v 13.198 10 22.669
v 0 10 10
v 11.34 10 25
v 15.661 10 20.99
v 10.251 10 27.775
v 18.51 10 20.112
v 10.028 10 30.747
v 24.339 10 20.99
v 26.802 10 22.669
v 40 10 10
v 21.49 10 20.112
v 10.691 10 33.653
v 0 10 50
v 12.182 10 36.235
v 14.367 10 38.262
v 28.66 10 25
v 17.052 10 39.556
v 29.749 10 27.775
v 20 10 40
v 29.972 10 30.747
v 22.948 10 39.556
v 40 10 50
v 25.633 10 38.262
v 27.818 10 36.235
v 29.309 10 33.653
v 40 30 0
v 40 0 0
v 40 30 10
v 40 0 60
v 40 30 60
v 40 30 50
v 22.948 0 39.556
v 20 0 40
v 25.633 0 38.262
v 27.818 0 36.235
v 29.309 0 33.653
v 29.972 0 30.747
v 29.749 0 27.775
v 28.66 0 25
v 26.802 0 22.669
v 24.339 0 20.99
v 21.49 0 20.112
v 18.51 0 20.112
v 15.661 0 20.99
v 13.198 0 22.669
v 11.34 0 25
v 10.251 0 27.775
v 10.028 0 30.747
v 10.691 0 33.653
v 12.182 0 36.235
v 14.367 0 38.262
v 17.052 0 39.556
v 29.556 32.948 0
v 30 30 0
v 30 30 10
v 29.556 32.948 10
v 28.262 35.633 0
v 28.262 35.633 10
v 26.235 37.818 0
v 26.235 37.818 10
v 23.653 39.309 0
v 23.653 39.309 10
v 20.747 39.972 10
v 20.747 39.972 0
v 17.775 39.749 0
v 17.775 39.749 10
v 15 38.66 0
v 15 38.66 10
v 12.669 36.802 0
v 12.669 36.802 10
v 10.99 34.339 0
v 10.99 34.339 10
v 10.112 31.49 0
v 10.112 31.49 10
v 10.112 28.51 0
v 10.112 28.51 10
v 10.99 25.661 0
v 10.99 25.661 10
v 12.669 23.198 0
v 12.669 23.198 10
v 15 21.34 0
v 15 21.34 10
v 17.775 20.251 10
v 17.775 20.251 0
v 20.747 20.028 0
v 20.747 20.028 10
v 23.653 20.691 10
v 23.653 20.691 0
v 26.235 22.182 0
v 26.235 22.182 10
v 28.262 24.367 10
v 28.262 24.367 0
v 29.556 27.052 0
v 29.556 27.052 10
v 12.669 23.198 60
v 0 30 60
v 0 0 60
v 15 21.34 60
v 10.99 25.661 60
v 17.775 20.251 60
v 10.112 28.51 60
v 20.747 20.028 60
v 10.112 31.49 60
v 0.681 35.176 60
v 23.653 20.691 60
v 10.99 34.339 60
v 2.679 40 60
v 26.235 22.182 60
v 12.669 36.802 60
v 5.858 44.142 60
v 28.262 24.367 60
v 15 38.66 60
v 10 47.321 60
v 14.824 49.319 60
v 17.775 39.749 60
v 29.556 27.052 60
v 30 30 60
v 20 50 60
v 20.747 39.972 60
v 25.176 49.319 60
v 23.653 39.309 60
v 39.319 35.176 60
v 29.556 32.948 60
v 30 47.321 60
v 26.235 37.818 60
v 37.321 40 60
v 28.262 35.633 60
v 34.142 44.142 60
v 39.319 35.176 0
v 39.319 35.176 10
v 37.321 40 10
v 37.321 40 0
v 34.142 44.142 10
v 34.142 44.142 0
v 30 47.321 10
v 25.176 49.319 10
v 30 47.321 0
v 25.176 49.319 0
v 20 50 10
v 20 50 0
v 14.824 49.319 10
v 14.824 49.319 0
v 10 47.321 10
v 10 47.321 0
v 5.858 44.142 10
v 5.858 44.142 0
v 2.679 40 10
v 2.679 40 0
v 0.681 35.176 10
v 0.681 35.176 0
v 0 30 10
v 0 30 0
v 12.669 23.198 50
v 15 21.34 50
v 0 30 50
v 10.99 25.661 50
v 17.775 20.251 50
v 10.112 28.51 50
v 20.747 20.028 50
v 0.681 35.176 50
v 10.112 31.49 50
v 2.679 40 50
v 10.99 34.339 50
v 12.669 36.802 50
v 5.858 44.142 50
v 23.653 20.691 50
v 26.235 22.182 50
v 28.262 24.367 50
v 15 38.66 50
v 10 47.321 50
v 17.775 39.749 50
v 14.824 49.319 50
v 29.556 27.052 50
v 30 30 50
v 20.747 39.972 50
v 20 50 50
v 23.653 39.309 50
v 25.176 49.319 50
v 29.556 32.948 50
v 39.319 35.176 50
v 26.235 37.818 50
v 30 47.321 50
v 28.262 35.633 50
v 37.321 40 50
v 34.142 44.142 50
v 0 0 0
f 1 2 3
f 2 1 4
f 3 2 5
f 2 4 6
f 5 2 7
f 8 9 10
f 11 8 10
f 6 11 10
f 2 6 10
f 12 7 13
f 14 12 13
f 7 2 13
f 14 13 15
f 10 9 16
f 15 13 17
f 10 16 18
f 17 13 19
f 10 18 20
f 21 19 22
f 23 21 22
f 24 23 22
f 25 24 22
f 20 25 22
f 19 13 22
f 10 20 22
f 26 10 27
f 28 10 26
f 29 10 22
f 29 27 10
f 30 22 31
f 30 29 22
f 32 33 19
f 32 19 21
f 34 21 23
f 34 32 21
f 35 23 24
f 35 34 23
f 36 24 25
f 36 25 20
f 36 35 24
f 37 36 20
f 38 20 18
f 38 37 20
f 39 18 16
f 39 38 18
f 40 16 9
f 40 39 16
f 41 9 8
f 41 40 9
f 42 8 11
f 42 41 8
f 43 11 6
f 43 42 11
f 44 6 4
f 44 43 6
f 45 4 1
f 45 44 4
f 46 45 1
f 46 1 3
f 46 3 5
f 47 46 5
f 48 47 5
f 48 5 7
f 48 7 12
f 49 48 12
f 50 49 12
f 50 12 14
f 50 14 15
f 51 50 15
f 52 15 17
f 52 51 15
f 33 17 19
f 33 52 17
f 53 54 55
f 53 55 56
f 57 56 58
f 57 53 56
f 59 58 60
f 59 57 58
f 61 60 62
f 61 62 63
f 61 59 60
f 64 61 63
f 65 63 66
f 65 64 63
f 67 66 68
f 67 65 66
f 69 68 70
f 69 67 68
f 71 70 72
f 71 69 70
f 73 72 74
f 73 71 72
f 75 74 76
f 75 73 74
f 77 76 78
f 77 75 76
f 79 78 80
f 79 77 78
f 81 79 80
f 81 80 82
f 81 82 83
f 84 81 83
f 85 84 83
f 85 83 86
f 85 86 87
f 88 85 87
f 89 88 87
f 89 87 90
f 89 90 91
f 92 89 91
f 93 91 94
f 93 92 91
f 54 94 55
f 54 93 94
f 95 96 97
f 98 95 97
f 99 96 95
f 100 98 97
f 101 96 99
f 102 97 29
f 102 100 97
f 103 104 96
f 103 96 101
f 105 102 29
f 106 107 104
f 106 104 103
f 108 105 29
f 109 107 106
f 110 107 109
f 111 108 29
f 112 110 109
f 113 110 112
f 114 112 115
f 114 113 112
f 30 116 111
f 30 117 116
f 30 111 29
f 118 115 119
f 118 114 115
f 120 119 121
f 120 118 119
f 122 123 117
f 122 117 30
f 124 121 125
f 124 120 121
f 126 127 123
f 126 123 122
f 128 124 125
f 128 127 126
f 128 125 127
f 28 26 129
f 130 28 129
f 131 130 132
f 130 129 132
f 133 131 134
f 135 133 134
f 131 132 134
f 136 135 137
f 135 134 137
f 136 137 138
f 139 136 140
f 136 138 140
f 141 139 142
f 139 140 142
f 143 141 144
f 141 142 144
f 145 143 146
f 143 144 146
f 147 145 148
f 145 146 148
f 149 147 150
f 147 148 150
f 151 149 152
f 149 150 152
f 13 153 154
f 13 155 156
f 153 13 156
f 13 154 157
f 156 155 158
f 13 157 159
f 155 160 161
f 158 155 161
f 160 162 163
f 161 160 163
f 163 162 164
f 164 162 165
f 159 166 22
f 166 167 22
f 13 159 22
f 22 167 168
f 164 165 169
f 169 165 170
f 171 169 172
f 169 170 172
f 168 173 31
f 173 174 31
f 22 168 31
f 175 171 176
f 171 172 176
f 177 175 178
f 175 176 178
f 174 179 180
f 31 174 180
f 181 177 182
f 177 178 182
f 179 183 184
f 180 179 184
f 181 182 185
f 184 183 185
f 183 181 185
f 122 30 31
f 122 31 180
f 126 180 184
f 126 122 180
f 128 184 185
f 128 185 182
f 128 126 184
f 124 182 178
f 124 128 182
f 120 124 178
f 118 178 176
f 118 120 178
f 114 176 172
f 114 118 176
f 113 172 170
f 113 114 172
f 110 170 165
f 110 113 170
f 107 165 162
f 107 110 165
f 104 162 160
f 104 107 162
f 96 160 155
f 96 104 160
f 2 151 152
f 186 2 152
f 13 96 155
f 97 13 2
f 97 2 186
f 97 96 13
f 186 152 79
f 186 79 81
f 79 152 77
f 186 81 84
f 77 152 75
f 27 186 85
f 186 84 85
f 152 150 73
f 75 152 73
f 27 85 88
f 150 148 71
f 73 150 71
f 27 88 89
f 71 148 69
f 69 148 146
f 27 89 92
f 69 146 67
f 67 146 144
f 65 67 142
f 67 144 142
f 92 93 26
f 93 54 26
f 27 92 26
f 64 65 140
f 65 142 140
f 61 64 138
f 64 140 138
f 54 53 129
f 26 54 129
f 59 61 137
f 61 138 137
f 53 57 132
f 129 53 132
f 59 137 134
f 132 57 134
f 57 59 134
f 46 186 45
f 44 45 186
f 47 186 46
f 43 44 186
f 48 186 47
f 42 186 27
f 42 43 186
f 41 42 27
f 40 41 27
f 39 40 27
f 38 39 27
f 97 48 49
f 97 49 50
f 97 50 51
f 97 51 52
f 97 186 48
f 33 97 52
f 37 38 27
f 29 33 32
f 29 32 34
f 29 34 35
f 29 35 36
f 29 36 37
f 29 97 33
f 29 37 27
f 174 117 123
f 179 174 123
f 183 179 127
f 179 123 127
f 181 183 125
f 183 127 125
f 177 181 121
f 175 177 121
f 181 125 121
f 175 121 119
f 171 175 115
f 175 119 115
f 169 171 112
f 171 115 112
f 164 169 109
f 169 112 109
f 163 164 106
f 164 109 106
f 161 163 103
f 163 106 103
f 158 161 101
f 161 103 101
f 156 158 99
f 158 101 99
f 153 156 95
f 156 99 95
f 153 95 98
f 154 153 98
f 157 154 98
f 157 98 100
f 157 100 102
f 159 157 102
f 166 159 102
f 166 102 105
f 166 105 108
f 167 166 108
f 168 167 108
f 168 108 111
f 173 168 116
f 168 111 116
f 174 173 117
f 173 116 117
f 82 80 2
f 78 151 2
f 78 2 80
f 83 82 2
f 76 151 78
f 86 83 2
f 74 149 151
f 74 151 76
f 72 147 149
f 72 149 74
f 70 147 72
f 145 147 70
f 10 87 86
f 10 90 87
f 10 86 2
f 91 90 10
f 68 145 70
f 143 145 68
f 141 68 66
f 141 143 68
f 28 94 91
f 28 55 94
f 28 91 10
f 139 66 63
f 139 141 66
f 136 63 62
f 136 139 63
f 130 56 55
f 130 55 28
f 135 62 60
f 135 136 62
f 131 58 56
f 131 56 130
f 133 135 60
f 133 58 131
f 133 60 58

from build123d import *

# Parameters (mm, degrees)
SKETCH1_W           = 40
SKETCH1_H           = 10
BOSS_EXTRUDE1_DEPTH = 30
SKETCH1_3_R         = 10
BOSS_EXTRUDE2_DEPTH = 10
SKETCH3_R           = 10
CUT_EXTRUDE1_DEPTH  = 10


with BuildPart() as part:
    # Sketch1 → Boss-Extrude1 (new body)
    with BuildSketch(Plane.XY):
        with Locations((20, 5)):
            Rectangle(SKETCH1_W, SKETCH1_H)
    boss_extrude1 = extrude(amount=BOSS_EXTRUDE1_DEPTH)

    # Sketch1<3> → Boss-Extrude2 (add)
    with BuildSketch(Plane.XY):
        with BuildLine():
            Line((0, 30), (0, 10))
            Line((0, 10), (40, 10))
            Line((40, 10), (40, 30))
            ThreePointArc((40, 30), (20, 50), (0, 30))
        make_face()
        with Locations((20, 30)):
            Circle(SKETCH1_3_R, mode=Mode.SUBTRACT)
    boss_extrude2 = extrude(amount=BOSS_EXTRUDE2_DEPTH)

    # Mirror2: Boss-Extrude1, Boss-Extrude2 across plane
    add(boss_extrude1.mirror(Plane.XY.offset(30)))
    add(boss_extrude2.mirror(Plane.XY.offset(30)))

    # Sketch3 → Cut-Extrude1 (cut)
    with BuildSketch(Plane(origin=(0, 0, 0), x_dir=(1, 0, 0), z_dir=(0, 1, 0))):
        with Locations((20, -30)):
            Circle(SKETCH3_R)
    extrude(amount=CUT_EXTRUDE1_DEPTH, mode=Mode.SUBTRACT)


solid = part.part
